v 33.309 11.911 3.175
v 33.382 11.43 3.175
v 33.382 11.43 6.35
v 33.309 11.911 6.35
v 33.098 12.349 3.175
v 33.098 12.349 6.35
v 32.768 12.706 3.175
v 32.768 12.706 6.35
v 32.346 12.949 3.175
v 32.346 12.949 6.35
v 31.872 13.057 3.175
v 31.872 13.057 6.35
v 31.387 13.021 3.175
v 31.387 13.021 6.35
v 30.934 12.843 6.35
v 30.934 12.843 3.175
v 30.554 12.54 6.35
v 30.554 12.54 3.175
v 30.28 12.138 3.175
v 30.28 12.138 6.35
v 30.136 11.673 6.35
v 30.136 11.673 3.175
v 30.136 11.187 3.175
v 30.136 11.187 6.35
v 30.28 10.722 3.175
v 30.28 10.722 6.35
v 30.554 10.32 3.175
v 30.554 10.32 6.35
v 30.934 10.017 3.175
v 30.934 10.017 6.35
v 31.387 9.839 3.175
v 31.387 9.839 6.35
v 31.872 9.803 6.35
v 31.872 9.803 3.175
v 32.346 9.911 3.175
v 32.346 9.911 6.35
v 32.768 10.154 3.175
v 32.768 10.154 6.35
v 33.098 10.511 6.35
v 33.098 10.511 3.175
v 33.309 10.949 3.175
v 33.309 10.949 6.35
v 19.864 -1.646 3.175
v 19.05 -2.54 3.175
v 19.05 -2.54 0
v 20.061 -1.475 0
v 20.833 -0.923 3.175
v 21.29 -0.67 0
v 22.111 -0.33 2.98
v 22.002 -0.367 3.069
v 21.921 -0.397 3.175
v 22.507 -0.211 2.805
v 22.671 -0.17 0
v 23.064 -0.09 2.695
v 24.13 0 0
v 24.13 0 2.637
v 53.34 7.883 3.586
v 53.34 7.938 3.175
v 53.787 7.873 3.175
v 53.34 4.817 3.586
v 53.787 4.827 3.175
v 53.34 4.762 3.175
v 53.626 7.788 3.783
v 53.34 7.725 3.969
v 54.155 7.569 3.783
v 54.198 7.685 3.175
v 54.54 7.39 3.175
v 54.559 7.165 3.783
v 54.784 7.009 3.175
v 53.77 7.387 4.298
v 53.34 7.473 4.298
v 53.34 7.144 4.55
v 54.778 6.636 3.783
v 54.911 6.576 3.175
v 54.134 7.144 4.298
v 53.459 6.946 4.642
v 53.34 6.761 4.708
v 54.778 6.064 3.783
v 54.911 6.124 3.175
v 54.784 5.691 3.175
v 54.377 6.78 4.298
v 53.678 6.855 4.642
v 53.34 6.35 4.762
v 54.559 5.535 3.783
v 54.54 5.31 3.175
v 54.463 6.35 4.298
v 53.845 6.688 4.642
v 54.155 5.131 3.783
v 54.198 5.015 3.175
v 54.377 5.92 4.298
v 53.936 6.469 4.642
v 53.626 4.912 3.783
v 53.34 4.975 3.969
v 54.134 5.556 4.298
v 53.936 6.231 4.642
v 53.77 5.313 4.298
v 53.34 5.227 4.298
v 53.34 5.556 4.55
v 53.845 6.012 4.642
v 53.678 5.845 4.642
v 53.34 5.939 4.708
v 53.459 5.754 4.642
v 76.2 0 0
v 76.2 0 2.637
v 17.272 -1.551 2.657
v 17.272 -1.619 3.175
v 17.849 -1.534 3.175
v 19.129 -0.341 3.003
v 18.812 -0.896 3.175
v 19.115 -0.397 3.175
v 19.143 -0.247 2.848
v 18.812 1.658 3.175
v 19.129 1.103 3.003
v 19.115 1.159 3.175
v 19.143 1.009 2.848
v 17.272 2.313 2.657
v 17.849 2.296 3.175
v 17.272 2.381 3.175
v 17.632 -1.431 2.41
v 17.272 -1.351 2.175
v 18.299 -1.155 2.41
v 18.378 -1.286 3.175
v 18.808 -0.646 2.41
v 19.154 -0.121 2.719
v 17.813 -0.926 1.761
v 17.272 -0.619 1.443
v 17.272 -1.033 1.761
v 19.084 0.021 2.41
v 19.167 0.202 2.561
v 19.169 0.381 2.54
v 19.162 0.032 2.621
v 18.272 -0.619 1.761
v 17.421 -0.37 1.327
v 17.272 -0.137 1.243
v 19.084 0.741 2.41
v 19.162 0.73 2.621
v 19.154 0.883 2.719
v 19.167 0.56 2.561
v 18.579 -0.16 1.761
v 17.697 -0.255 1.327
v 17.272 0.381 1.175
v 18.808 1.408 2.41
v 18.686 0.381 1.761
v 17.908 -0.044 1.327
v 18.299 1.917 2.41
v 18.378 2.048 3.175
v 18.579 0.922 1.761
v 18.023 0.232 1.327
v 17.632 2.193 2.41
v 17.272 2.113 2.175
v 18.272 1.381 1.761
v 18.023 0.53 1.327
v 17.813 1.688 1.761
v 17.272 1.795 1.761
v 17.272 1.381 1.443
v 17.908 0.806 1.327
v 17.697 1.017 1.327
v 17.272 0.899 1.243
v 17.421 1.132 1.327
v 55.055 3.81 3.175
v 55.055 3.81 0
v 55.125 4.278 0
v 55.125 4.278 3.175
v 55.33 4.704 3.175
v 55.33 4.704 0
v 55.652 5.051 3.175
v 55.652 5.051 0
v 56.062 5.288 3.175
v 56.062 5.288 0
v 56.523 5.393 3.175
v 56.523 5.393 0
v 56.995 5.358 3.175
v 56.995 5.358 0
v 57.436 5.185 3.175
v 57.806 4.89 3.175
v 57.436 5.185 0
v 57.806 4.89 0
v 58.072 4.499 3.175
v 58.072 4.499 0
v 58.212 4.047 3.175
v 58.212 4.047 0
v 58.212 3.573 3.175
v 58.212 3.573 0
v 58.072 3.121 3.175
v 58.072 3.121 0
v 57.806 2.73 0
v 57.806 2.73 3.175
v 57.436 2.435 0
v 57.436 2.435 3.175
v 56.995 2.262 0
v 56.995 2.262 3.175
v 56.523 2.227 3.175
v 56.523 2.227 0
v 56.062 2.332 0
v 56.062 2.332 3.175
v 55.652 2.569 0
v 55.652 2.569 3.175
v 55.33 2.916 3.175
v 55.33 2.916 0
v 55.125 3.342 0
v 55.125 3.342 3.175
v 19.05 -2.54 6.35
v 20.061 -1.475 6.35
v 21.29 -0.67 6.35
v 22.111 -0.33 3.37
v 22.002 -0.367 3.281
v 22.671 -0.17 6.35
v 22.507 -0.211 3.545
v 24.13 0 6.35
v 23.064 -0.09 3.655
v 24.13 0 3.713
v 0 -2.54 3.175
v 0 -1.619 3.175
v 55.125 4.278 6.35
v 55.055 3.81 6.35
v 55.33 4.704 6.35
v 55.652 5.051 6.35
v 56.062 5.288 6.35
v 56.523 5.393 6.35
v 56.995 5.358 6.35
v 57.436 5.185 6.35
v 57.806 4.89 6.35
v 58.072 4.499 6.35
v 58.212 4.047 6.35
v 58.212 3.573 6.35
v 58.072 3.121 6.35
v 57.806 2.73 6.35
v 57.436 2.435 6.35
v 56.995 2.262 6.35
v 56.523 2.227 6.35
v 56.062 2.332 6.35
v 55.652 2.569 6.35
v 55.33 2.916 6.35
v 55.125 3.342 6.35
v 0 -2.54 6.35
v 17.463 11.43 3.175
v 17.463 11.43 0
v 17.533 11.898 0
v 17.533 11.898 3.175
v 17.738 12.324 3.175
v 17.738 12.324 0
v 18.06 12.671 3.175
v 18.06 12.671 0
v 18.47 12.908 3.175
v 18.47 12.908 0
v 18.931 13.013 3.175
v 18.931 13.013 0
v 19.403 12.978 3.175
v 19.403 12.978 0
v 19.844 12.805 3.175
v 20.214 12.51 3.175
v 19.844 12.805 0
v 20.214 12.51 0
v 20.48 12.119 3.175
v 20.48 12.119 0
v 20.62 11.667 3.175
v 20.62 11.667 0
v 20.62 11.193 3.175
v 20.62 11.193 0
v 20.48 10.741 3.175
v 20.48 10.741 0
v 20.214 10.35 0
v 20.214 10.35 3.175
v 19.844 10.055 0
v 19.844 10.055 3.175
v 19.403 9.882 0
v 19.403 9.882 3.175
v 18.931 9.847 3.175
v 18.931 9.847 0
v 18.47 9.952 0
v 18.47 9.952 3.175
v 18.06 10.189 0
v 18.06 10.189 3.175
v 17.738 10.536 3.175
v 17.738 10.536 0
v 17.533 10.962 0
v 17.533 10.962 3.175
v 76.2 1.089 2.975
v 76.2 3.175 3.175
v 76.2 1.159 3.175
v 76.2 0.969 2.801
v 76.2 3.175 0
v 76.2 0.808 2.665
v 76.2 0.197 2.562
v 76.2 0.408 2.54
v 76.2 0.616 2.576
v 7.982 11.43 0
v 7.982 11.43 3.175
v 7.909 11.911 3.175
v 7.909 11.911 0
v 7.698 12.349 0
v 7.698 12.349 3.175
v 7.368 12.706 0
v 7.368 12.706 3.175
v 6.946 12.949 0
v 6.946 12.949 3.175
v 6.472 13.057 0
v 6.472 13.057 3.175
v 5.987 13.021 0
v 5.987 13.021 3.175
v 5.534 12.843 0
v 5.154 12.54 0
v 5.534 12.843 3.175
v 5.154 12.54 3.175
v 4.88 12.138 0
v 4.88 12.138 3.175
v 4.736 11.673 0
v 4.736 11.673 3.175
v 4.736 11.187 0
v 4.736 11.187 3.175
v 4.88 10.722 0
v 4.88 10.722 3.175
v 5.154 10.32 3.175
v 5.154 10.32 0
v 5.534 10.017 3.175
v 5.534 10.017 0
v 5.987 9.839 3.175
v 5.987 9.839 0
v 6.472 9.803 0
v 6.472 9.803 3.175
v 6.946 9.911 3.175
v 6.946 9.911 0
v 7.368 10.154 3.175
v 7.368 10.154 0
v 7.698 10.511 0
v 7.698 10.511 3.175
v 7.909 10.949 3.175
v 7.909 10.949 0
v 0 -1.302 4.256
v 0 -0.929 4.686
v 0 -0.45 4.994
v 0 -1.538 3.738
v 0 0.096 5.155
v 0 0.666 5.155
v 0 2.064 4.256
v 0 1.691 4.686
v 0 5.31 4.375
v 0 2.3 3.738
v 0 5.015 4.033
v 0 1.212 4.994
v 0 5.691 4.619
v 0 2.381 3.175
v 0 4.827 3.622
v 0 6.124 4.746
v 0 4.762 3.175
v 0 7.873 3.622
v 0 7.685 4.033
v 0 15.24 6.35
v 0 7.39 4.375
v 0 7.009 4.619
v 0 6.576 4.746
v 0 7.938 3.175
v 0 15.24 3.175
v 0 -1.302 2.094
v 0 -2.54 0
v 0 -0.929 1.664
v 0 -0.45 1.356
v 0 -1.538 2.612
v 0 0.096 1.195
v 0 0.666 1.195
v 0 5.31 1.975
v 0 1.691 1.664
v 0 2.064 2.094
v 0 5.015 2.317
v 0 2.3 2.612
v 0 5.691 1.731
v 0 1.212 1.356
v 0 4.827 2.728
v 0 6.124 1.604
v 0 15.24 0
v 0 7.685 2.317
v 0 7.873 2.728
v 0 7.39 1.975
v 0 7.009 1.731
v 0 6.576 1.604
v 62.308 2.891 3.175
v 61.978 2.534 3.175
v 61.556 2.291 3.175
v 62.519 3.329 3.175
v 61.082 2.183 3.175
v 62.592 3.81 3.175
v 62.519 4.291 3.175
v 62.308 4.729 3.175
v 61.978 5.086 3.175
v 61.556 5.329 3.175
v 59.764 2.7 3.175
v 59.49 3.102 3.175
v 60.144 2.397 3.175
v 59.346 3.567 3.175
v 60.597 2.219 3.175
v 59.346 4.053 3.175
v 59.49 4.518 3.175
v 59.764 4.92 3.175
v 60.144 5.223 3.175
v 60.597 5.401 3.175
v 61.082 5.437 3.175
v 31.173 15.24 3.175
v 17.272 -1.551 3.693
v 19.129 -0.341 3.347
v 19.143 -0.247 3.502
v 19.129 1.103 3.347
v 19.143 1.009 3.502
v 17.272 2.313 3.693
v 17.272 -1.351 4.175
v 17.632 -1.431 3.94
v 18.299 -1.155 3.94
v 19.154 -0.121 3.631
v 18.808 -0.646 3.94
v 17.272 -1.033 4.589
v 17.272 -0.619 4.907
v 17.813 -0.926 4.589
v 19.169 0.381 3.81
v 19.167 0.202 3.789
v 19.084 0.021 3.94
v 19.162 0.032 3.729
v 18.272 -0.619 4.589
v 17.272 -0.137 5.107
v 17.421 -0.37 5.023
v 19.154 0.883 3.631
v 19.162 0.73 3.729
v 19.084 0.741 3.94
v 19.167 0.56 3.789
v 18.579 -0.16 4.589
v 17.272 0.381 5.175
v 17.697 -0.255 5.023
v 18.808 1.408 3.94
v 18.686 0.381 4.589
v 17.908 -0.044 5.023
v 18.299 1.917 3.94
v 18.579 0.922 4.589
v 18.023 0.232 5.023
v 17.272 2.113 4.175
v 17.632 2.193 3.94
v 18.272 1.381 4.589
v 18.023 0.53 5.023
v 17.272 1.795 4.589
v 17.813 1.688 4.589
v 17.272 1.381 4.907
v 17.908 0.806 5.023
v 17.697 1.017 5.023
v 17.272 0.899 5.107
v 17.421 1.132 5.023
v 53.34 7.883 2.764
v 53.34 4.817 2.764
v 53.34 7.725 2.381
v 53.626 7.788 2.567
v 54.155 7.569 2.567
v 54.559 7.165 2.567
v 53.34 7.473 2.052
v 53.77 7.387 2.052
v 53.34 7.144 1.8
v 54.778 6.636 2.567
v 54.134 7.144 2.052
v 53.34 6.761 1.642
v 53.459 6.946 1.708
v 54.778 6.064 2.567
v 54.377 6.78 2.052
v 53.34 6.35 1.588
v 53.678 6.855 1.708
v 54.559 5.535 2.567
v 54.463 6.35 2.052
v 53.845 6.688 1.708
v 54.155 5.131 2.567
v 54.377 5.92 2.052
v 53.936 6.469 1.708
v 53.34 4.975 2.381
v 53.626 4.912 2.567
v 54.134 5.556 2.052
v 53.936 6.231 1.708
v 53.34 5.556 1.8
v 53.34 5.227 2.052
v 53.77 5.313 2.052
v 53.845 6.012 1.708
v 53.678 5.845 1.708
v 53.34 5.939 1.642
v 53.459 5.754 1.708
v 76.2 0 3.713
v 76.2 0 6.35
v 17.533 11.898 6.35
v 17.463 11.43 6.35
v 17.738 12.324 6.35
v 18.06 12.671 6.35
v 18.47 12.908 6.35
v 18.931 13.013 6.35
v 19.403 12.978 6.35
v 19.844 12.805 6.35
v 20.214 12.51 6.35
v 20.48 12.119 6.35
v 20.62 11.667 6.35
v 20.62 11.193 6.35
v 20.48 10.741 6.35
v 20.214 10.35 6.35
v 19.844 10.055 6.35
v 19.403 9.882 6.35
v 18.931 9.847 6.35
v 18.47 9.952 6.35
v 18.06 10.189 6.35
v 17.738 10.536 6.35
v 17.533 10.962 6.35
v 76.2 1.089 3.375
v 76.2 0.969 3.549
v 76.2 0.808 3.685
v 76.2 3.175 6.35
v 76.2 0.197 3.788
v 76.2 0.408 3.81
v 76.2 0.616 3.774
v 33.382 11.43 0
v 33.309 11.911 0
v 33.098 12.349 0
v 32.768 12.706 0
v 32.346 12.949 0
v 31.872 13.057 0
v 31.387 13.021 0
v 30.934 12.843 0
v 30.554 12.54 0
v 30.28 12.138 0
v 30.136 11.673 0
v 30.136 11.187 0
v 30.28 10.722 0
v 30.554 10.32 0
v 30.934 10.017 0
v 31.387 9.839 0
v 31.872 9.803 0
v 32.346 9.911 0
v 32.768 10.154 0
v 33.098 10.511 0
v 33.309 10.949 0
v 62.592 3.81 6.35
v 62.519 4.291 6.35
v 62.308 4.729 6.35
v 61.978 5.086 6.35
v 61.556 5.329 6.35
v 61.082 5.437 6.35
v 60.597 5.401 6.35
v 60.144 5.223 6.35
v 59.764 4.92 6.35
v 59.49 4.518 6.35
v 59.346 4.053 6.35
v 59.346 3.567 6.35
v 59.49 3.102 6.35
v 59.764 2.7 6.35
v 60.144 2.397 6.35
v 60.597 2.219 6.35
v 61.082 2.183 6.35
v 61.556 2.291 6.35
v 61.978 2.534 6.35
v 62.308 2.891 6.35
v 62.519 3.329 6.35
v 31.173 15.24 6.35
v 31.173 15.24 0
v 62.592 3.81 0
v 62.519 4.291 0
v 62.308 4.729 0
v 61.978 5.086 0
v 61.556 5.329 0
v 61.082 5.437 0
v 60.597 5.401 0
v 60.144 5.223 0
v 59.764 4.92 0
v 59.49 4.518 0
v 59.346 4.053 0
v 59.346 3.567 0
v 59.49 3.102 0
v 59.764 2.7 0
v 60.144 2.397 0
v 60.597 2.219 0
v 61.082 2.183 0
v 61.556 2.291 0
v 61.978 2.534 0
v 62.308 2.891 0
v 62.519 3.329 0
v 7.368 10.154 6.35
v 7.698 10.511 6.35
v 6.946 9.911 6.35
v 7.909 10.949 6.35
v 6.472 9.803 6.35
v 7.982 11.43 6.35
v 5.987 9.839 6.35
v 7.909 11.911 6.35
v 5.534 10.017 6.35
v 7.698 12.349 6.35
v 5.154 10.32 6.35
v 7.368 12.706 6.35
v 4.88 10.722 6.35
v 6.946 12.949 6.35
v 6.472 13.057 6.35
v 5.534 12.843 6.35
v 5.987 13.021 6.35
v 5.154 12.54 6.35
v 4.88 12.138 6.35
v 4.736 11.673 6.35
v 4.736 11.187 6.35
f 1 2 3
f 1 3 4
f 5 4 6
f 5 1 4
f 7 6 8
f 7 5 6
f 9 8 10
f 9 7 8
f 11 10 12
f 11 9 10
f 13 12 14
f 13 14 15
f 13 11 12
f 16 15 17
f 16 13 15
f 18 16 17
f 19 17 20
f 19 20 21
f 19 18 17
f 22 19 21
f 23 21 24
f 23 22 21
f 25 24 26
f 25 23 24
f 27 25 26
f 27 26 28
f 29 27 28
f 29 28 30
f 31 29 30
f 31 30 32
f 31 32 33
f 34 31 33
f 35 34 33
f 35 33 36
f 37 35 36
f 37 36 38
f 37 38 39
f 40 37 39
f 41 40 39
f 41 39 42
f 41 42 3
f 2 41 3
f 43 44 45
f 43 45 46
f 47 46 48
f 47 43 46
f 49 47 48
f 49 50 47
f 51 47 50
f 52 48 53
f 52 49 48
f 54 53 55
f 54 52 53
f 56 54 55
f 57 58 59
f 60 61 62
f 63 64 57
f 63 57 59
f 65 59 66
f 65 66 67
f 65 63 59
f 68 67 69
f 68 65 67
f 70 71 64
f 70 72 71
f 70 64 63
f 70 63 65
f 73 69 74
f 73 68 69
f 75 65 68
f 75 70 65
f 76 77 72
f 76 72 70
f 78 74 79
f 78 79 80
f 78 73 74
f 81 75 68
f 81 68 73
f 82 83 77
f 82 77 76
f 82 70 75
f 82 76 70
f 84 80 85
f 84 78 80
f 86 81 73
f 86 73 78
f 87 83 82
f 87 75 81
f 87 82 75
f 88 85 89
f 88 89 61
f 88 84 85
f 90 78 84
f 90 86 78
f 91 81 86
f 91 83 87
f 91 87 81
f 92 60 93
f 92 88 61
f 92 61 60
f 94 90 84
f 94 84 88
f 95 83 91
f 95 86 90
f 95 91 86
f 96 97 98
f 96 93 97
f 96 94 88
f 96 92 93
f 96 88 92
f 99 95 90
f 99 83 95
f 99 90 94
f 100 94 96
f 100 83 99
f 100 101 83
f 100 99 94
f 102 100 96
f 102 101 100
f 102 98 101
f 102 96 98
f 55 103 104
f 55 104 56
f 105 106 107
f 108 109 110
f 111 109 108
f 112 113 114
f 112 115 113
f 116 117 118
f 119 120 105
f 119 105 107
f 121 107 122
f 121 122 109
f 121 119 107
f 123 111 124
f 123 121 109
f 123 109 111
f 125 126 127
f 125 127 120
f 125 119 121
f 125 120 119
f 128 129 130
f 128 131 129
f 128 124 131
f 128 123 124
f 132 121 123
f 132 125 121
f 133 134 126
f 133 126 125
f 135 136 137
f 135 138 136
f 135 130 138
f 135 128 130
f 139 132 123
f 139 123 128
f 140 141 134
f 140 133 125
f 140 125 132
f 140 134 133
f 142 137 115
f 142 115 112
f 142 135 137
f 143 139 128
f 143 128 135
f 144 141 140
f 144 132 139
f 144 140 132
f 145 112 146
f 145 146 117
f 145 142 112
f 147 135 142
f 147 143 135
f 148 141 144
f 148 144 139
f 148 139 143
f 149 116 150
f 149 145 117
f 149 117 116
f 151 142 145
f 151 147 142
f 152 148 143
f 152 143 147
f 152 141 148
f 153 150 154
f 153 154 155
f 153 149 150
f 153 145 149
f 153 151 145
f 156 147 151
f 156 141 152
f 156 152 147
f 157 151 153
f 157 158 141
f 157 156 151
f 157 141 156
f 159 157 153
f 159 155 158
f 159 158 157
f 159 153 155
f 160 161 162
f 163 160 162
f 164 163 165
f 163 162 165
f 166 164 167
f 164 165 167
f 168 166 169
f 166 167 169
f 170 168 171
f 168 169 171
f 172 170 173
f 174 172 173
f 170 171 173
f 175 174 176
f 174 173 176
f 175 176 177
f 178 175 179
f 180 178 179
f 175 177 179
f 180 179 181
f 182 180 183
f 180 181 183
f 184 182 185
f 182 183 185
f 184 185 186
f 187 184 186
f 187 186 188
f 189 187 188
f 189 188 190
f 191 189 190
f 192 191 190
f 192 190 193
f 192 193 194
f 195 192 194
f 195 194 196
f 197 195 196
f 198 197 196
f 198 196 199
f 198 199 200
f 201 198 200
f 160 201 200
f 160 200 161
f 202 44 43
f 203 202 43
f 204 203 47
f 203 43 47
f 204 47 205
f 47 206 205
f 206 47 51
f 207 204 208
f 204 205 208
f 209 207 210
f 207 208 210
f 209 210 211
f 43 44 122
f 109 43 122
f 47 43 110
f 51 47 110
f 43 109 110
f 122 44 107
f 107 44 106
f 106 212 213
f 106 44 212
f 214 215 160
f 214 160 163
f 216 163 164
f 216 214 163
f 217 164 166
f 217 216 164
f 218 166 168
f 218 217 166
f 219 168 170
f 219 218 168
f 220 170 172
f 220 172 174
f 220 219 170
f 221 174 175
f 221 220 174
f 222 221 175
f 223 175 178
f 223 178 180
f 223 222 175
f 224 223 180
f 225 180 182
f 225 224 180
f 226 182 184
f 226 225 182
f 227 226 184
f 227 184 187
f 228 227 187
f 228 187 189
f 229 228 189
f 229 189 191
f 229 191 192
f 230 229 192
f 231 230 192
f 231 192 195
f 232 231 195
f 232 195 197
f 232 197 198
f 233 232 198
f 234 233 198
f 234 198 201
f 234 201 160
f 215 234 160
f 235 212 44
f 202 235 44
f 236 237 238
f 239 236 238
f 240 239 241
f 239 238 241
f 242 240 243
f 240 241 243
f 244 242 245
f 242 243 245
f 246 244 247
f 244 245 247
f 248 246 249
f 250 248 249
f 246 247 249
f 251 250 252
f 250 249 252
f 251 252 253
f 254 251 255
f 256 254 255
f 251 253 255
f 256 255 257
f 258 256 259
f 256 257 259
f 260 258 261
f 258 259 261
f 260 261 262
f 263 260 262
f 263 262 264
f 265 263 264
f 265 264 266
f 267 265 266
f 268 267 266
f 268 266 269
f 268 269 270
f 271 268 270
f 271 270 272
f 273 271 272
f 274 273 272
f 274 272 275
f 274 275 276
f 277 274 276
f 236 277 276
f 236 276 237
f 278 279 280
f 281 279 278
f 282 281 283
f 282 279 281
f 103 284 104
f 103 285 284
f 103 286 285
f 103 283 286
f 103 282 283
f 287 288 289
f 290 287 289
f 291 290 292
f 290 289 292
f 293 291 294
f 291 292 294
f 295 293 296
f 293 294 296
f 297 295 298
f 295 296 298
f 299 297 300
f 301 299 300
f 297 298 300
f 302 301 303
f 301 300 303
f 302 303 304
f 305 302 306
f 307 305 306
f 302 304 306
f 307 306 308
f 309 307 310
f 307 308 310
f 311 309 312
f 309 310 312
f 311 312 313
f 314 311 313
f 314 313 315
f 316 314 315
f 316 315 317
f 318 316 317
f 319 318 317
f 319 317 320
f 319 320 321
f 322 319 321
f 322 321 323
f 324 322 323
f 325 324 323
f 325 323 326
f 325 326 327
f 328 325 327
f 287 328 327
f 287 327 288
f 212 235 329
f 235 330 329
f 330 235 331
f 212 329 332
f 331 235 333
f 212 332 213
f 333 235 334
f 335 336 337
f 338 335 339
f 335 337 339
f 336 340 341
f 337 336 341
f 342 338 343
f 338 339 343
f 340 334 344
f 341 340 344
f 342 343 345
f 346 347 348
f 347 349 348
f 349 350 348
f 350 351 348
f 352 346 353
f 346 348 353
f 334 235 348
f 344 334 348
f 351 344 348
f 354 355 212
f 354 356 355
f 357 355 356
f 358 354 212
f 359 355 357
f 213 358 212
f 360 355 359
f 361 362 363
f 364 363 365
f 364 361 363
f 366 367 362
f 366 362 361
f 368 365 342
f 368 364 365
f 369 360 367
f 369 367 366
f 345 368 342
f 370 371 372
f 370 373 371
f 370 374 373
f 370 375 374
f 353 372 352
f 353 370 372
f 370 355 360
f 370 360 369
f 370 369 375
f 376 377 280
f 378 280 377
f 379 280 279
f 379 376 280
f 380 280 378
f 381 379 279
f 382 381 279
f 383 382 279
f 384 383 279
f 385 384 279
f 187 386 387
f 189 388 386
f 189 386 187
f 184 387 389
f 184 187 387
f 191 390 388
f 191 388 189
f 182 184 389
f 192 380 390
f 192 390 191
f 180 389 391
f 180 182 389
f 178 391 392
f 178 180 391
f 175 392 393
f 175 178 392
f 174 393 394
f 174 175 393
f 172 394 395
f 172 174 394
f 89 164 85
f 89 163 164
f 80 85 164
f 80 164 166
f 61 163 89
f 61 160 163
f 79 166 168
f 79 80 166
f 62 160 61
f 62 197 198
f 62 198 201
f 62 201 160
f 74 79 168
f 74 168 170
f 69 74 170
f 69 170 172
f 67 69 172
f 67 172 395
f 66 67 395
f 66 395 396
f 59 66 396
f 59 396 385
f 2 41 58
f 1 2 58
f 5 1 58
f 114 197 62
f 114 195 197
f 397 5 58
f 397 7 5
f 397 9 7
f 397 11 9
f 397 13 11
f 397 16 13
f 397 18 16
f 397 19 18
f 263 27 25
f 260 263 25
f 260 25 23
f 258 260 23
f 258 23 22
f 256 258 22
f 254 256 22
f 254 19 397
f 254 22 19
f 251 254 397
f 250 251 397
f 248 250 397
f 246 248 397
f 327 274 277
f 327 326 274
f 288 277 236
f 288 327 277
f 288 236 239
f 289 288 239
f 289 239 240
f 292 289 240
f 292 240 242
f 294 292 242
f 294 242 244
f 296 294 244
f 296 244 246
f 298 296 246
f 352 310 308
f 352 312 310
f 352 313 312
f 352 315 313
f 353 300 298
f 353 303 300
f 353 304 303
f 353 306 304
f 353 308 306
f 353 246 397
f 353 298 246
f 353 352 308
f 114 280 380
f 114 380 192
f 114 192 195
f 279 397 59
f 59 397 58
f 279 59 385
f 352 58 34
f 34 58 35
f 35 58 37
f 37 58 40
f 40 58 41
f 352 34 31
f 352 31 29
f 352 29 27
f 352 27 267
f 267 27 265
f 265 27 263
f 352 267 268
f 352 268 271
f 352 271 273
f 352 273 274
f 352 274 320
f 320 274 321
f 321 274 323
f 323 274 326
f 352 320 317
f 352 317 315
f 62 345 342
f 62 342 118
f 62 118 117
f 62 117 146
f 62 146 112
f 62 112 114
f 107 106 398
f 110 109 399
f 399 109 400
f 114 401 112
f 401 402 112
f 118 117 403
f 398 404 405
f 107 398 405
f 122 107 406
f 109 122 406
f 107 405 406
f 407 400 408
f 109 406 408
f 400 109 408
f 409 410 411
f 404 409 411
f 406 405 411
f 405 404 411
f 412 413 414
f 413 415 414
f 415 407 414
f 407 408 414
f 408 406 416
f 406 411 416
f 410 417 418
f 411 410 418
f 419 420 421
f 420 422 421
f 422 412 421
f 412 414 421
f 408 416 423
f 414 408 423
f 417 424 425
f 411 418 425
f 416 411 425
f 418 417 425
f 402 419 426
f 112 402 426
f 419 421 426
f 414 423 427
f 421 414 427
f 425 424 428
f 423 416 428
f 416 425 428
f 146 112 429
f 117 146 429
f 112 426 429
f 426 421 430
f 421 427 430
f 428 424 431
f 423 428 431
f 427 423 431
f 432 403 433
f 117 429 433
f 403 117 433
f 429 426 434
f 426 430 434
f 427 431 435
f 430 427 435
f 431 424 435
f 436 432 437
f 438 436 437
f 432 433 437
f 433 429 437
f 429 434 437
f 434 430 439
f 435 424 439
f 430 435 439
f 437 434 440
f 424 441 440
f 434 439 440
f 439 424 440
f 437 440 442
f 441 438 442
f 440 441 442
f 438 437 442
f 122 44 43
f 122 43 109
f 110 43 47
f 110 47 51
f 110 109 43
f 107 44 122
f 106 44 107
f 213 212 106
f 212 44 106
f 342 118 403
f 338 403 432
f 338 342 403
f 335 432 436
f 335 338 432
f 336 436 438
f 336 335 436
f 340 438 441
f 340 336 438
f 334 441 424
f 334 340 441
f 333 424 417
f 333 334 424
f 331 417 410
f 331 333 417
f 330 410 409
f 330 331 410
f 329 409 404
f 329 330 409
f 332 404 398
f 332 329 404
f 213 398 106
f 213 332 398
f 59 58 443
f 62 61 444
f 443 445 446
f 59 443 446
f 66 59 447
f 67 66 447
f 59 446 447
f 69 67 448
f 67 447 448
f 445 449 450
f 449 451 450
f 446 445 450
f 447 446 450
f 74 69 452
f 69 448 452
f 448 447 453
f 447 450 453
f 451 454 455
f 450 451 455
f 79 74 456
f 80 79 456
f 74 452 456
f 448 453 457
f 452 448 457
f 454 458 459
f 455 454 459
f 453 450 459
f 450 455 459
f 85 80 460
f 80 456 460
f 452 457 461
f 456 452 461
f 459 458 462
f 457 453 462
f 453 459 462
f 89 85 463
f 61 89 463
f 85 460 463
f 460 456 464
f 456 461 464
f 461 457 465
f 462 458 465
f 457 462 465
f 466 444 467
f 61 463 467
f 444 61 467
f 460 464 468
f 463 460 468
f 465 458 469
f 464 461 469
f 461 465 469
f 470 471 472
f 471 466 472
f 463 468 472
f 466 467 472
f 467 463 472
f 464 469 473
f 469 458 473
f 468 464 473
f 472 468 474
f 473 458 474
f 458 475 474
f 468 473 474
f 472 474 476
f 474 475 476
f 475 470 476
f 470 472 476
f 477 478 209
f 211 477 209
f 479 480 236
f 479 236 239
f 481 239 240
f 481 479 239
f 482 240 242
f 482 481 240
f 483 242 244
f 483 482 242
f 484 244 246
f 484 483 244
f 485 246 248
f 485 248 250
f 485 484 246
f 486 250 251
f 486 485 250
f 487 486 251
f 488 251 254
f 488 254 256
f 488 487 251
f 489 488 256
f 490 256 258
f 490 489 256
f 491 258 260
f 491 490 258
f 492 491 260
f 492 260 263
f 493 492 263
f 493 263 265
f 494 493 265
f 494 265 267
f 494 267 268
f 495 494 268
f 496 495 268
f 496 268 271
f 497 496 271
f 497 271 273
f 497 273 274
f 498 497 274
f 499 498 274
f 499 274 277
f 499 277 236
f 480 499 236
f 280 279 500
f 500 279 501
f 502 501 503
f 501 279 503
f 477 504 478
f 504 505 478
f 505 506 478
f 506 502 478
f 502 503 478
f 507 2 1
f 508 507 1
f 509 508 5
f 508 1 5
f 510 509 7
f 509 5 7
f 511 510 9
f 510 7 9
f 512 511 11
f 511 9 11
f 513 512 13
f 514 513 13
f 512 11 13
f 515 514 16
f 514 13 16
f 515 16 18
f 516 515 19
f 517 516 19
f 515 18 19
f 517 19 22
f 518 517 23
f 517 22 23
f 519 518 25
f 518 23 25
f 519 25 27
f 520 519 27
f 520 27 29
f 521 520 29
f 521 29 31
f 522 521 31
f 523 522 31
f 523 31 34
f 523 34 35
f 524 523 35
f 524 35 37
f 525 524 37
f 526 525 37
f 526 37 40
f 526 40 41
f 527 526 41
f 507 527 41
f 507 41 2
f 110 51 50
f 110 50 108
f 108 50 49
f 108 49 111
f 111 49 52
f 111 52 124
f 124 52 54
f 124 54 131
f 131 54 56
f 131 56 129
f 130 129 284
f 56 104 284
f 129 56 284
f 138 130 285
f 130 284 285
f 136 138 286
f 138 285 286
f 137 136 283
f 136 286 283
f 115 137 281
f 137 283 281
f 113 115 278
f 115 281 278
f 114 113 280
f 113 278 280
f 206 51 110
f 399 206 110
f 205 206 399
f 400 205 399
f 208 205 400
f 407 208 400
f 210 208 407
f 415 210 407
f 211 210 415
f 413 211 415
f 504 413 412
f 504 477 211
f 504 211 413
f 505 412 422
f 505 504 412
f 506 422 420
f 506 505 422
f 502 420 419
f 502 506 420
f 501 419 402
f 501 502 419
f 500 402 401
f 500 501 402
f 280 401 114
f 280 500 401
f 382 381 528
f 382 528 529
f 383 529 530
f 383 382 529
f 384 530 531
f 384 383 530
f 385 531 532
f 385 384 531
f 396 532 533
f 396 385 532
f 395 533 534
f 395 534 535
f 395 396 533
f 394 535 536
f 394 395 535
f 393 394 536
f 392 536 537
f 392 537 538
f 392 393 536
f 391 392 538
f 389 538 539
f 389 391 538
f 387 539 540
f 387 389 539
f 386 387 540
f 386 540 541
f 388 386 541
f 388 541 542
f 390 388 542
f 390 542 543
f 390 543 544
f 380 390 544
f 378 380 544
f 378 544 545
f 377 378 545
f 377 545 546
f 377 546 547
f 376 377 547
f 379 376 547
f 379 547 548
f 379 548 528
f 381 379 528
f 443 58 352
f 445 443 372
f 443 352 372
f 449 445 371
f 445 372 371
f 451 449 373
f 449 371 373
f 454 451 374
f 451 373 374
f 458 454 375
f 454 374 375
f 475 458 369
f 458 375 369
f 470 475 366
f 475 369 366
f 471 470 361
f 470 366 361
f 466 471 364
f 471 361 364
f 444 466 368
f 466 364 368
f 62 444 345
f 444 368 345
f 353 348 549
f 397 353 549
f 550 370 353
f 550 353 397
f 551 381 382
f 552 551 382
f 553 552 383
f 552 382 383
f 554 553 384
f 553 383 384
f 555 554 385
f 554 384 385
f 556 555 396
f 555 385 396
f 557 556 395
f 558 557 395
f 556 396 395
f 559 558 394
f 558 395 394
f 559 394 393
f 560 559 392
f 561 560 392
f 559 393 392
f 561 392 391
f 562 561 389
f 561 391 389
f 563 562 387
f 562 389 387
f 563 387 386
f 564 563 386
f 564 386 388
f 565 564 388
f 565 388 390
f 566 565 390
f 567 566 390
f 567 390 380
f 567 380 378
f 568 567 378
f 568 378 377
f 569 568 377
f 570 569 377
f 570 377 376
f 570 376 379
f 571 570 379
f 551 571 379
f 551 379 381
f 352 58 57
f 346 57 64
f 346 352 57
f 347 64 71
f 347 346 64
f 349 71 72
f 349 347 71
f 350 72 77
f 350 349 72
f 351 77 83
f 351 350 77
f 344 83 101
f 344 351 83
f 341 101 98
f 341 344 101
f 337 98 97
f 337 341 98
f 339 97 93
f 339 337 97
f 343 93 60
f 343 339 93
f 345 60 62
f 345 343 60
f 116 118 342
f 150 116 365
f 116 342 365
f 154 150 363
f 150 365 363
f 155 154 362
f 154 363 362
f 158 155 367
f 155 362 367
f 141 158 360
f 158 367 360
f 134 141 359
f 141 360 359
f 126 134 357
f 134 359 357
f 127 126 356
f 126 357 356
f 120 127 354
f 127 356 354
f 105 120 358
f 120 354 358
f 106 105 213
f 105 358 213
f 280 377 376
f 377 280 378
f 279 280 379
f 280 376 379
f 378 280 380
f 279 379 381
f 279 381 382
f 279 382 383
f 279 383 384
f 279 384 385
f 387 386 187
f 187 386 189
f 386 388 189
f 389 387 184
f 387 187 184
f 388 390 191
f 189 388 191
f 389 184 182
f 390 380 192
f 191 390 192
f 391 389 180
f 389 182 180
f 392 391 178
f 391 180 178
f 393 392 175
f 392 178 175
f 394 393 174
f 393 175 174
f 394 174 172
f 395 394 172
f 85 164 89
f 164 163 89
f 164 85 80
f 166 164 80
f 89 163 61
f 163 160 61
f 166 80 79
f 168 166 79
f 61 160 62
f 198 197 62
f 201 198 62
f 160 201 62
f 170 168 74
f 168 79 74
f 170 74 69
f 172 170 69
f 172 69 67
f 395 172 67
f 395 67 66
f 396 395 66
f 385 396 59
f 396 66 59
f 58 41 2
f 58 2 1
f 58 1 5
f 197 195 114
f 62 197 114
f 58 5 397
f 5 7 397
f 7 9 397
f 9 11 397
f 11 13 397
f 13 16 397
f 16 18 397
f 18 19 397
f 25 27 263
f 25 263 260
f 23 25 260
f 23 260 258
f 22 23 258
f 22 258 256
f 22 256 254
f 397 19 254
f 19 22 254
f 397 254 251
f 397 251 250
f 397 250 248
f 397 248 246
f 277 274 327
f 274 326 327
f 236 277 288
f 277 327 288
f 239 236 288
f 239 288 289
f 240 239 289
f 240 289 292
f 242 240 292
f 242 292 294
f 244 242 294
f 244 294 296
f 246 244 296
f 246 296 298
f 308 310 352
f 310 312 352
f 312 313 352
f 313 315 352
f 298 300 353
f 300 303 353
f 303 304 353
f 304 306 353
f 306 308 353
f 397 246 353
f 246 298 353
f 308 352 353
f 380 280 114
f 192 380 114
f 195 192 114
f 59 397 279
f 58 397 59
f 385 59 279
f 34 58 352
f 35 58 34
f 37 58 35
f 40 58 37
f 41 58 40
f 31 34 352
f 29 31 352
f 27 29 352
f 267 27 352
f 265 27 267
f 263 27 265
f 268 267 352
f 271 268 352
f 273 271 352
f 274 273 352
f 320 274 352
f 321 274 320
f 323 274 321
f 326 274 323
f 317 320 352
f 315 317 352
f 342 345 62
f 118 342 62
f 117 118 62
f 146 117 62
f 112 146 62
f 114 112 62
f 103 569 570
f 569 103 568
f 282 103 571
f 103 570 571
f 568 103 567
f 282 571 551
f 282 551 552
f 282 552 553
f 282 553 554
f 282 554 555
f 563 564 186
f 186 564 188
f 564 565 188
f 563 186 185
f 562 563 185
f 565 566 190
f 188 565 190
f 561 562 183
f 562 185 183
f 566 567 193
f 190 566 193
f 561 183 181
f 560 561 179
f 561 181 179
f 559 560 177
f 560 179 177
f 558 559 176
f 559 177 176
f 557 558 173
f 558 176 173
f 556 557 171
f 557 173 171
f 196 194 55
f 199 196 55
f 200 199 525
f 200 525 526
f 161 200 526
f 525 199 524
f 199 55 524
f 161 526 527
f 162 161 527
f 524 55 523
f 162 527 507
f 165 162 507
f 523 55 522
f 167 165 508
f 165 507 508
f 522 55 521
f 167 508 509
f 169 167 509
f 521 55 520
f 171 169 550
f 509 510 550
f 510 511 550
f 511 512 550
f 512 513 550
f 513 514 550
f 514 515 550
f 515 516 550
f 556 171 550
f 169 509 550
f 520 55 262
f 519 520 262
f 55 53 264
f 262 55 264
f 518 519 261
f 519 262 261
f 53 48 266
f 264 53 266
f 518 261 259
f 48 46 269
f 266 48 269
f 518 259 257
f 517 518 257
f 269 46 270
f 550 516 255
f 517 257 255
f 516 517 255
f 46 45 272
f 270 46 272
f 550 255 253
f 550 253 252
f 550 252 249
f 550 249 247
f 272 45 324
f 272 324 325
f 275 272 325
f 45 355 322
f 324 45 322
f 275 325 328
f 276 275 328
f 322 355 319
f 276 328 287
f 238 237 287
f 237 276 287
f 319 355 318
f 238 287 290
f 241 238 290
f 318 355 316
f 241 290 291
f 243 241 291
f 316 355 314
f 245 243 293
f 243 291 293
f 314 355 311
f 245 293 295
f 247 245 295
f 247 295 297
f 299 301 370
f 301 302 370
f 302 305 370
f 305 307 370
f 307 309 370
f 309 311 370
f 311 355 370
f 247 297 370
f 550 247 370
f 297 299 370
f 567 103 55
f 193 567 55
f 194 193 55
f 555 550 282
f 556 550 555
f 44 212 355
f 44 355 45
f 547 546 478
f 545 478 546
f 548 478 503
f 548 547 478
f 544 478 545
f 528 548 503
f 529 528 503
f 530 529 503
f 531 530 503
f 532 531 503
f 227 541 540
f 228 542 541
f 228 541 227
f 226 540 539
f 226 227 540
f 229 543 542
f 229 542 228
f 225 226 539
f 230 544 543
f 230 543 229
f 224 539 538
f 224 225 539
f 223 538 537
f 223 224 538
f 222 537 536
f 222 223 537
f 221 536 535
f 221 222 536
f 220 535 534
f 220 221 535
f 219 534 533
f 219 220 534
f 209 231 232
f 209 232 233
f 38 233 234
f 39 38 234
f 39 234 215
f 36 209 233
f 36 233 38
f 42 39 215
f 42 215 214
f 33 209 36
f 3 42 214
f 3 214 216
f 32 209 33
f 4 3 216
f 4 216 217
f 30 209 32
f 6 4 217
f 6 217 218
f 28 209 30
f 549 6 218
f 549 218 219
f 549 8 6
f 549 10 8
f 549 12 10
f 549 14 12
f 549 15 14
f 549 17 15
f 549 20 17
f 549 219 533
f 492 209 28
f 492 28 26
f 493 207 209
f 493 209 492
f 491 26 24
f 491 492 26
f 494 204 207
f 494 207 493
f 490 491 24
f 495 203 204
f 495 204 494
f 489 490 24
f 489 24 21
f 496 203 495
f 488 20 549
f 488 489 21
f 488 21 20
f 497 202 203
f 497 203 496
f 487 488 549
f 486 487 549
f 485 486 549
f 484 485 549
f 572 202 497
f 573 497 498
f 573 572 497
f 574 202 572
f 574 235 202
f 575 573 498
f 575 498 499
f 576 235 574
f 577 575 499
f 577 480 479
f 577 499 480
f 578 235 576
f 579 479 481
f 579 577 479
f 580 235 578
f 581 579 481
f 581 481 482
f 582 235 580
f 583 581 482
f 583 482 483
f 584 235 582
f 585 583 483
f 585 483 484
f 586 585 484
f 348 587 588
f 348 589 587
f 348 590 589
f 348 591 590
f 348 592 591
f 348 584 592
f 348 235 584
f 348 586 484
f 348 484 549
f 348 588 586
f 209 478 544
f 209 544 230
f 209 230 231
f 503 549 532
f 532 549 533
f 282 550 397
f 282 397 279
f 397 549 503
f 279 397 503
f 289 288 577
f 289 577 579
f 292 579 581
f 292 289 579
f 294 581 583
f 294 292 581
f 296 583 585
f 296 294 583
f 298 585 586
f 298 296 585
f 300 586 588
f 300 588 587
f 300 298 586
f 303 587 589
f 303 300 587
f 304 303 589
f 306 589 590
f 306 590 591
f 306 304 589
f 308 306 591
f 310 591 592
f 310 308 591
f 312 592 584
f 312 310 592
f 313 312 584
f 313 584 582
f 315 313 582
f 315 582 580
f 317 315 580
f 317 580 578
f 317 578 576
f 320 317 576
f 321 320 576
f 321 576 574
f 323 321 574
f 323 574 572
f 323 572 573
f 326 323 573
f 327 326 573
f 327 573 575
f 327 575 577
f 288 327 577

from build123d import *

# Parameters (mm, degrees)
BOSS_EXTRUDE1_DEPTH        = 3.175
SKETCH11_W                 = 19.05
SKETCH11_H                 = 3.175
BOSS_EXTRUDE2_DEPTH        = 2.54
FILLET2_R                  = 6.35
SKETCH3_R                  = 2
CUT_EXTRUDE2_DEPTH         = 17.272
SKETCH2_R                  = 0.79375
CUT_EXTRUDE1_DEPTH         = 78.773891667
SKETCH9_R                  = 1.5875
CUT_EXTRUDE3_DEPTH         = 53.34
F_4_CLEARANCE_HOLE1_D      = 3.2639
F_1_8_0_1250_DOWEL_HOLE1_D = 3.175


with BuildPart() as part:
    # Sketch1 → Boss-Extrude1 (new body)
    with BuildSketch(Plane.XY):
        Polygon((0, 0), (0, 15.24), (31.172807007, 15.24), (76.2, 3.175), (76.2, 0), align=None)
    extrude(amount=BOSS_EXTRUDE1_DEPTH)

    # Sketch11 → Boss-Extrude2 (add)
    with BuildSketch(Plane.XZ):
        with Locations((9.525, 1.5875)):
            Rectangle(SKETCH11_W, SKETCH11_H)
    extrude(amount=BOSS_EXTRUDE2_DEPTH)

    # Fillet2
    # the kernel refuses this fillet: 6.35 mm, written as the material it adds along each edge
    with BuildSketch(Plane(origin=(19.05, 0, 3.175), x_dir=(0, -1, 0), z_dir=(0, 0, -1))) as fillet2_piece_1:
        with BuildLine():
            CenterArc((6.35, -5.08), FILLET2_R, 126.869897646, 53.130102354)
            Line((0, -5.08), (-0.127, -5.08))
            Line((-0.127, -5.08), (-0.127, 0))
            Line((-0.127, 0), (0, 0.127))
            ThreePointArc((0, 0.127), (1.27, 0.127), (2.4638, 0.1016))
            Line((2.4638, 0.1016), (2.54, 0))
        make_face()
    extrude(amount=3.175)

    # Sketch3 → Cut-Extrude2 (cut)
    with BuildSketch(Plane.ZY):
        with Locations((3.175, 0.381)):
            Circle(SKETCH3_R)
    extrude(amount=-CUT_EXTRUDE2_DEPTH, mode=Mode.SUBTRACT)

    # Sketch2 → Cut-Extrude1 (cut, through all)
    with BuildSketch(Plane(origin=(76.2, 0, 0), x_dir=(0, 0, -1), z_dir=(1, 0, 0))):
        with Locations((-3.33375, 0.381)):
            Circle(SKETCH2_R)
    extrude(amount=-CUT_EXTRUDE1_DEPTH, mode=Mode.SUBTRACT)

    # Sketch9 → Cut-Extrude3 (cut)
    with BuildSketch(Plane.ZY):
        with Locations((3.175, 6.35)):
            Circle(SKETCH9_R)
    extrude(amount=-CUT_EXTRUDE3_DEPTH, mode=Mode.SUBTRACT)

    # Sketch10 → Cut-Revolve2 (revolve, cut)
    with BuildSketch(Plane.ZY.offset(-53.34)):
        with BuildLine():
            Line((3.175, 6.35), (3.175, 7.9375))
            ThreePointArc((3.175, 7.9375), (2.052467985, 7.472532015), (1.5875, 6.35))
            Line((1.5875, 6.35), (3.175, 6.35))
        make_face()
    revolve(axis=Axis((53.34, 6.35, 3.175), (0, 0, -1)), mode=Mode.SUBTRACT)

    # Sketch12 → Cut-Revolve3 (revolve, cut)
    with BuildSketch(Plane.ZY.offset(-17.272)):
        with BuildLine():
            Line((1.175, 0.381), (3.175, 0.381))
            Line((3.175, 0.381), (3.175, 2.381))
            ThreePointArc((3.175, 2.381), (1.760786438, 1.795213562), (1.175, 0.381))
        make_face()
    revolve(axis=Axis((17.272, 0.381, 1.175), (0, 0, 1)), mode=Mode.SUBTRACT)

    # #4 Clearance Hole1 (through all)
    with Locations(Plane(origin=(0, 0, 0), x_dir=(-1, 0, 0), z_dir=(0, 0, -1))):
        with Locations((-31.75, 11.43), (-6.35, 11.43), (-60.96, 3.81)):
            Hole(F_4_CLEARANCE_HOLE1_D / 2)

    # 1/8 (0.1250) Dowel Hole1 (through all)
    with Locations(Plane.XY.offset(3.175)):
        with Locations((19.05, 11.43), (56.642, 3.81)):
            Hole(F_1_8_0_1250_DOWEL_HOLE1_D / 2)


with BuildPart() as body_2:
    # Mirror1: mirrored copy
    add(part.part.mirror(Plane(origin=(0, 0, 3.175), x_dir=(1, 0, 0), z_dir=(0, 0, -1))))


solid = Compound([part.part, body_2.part])
